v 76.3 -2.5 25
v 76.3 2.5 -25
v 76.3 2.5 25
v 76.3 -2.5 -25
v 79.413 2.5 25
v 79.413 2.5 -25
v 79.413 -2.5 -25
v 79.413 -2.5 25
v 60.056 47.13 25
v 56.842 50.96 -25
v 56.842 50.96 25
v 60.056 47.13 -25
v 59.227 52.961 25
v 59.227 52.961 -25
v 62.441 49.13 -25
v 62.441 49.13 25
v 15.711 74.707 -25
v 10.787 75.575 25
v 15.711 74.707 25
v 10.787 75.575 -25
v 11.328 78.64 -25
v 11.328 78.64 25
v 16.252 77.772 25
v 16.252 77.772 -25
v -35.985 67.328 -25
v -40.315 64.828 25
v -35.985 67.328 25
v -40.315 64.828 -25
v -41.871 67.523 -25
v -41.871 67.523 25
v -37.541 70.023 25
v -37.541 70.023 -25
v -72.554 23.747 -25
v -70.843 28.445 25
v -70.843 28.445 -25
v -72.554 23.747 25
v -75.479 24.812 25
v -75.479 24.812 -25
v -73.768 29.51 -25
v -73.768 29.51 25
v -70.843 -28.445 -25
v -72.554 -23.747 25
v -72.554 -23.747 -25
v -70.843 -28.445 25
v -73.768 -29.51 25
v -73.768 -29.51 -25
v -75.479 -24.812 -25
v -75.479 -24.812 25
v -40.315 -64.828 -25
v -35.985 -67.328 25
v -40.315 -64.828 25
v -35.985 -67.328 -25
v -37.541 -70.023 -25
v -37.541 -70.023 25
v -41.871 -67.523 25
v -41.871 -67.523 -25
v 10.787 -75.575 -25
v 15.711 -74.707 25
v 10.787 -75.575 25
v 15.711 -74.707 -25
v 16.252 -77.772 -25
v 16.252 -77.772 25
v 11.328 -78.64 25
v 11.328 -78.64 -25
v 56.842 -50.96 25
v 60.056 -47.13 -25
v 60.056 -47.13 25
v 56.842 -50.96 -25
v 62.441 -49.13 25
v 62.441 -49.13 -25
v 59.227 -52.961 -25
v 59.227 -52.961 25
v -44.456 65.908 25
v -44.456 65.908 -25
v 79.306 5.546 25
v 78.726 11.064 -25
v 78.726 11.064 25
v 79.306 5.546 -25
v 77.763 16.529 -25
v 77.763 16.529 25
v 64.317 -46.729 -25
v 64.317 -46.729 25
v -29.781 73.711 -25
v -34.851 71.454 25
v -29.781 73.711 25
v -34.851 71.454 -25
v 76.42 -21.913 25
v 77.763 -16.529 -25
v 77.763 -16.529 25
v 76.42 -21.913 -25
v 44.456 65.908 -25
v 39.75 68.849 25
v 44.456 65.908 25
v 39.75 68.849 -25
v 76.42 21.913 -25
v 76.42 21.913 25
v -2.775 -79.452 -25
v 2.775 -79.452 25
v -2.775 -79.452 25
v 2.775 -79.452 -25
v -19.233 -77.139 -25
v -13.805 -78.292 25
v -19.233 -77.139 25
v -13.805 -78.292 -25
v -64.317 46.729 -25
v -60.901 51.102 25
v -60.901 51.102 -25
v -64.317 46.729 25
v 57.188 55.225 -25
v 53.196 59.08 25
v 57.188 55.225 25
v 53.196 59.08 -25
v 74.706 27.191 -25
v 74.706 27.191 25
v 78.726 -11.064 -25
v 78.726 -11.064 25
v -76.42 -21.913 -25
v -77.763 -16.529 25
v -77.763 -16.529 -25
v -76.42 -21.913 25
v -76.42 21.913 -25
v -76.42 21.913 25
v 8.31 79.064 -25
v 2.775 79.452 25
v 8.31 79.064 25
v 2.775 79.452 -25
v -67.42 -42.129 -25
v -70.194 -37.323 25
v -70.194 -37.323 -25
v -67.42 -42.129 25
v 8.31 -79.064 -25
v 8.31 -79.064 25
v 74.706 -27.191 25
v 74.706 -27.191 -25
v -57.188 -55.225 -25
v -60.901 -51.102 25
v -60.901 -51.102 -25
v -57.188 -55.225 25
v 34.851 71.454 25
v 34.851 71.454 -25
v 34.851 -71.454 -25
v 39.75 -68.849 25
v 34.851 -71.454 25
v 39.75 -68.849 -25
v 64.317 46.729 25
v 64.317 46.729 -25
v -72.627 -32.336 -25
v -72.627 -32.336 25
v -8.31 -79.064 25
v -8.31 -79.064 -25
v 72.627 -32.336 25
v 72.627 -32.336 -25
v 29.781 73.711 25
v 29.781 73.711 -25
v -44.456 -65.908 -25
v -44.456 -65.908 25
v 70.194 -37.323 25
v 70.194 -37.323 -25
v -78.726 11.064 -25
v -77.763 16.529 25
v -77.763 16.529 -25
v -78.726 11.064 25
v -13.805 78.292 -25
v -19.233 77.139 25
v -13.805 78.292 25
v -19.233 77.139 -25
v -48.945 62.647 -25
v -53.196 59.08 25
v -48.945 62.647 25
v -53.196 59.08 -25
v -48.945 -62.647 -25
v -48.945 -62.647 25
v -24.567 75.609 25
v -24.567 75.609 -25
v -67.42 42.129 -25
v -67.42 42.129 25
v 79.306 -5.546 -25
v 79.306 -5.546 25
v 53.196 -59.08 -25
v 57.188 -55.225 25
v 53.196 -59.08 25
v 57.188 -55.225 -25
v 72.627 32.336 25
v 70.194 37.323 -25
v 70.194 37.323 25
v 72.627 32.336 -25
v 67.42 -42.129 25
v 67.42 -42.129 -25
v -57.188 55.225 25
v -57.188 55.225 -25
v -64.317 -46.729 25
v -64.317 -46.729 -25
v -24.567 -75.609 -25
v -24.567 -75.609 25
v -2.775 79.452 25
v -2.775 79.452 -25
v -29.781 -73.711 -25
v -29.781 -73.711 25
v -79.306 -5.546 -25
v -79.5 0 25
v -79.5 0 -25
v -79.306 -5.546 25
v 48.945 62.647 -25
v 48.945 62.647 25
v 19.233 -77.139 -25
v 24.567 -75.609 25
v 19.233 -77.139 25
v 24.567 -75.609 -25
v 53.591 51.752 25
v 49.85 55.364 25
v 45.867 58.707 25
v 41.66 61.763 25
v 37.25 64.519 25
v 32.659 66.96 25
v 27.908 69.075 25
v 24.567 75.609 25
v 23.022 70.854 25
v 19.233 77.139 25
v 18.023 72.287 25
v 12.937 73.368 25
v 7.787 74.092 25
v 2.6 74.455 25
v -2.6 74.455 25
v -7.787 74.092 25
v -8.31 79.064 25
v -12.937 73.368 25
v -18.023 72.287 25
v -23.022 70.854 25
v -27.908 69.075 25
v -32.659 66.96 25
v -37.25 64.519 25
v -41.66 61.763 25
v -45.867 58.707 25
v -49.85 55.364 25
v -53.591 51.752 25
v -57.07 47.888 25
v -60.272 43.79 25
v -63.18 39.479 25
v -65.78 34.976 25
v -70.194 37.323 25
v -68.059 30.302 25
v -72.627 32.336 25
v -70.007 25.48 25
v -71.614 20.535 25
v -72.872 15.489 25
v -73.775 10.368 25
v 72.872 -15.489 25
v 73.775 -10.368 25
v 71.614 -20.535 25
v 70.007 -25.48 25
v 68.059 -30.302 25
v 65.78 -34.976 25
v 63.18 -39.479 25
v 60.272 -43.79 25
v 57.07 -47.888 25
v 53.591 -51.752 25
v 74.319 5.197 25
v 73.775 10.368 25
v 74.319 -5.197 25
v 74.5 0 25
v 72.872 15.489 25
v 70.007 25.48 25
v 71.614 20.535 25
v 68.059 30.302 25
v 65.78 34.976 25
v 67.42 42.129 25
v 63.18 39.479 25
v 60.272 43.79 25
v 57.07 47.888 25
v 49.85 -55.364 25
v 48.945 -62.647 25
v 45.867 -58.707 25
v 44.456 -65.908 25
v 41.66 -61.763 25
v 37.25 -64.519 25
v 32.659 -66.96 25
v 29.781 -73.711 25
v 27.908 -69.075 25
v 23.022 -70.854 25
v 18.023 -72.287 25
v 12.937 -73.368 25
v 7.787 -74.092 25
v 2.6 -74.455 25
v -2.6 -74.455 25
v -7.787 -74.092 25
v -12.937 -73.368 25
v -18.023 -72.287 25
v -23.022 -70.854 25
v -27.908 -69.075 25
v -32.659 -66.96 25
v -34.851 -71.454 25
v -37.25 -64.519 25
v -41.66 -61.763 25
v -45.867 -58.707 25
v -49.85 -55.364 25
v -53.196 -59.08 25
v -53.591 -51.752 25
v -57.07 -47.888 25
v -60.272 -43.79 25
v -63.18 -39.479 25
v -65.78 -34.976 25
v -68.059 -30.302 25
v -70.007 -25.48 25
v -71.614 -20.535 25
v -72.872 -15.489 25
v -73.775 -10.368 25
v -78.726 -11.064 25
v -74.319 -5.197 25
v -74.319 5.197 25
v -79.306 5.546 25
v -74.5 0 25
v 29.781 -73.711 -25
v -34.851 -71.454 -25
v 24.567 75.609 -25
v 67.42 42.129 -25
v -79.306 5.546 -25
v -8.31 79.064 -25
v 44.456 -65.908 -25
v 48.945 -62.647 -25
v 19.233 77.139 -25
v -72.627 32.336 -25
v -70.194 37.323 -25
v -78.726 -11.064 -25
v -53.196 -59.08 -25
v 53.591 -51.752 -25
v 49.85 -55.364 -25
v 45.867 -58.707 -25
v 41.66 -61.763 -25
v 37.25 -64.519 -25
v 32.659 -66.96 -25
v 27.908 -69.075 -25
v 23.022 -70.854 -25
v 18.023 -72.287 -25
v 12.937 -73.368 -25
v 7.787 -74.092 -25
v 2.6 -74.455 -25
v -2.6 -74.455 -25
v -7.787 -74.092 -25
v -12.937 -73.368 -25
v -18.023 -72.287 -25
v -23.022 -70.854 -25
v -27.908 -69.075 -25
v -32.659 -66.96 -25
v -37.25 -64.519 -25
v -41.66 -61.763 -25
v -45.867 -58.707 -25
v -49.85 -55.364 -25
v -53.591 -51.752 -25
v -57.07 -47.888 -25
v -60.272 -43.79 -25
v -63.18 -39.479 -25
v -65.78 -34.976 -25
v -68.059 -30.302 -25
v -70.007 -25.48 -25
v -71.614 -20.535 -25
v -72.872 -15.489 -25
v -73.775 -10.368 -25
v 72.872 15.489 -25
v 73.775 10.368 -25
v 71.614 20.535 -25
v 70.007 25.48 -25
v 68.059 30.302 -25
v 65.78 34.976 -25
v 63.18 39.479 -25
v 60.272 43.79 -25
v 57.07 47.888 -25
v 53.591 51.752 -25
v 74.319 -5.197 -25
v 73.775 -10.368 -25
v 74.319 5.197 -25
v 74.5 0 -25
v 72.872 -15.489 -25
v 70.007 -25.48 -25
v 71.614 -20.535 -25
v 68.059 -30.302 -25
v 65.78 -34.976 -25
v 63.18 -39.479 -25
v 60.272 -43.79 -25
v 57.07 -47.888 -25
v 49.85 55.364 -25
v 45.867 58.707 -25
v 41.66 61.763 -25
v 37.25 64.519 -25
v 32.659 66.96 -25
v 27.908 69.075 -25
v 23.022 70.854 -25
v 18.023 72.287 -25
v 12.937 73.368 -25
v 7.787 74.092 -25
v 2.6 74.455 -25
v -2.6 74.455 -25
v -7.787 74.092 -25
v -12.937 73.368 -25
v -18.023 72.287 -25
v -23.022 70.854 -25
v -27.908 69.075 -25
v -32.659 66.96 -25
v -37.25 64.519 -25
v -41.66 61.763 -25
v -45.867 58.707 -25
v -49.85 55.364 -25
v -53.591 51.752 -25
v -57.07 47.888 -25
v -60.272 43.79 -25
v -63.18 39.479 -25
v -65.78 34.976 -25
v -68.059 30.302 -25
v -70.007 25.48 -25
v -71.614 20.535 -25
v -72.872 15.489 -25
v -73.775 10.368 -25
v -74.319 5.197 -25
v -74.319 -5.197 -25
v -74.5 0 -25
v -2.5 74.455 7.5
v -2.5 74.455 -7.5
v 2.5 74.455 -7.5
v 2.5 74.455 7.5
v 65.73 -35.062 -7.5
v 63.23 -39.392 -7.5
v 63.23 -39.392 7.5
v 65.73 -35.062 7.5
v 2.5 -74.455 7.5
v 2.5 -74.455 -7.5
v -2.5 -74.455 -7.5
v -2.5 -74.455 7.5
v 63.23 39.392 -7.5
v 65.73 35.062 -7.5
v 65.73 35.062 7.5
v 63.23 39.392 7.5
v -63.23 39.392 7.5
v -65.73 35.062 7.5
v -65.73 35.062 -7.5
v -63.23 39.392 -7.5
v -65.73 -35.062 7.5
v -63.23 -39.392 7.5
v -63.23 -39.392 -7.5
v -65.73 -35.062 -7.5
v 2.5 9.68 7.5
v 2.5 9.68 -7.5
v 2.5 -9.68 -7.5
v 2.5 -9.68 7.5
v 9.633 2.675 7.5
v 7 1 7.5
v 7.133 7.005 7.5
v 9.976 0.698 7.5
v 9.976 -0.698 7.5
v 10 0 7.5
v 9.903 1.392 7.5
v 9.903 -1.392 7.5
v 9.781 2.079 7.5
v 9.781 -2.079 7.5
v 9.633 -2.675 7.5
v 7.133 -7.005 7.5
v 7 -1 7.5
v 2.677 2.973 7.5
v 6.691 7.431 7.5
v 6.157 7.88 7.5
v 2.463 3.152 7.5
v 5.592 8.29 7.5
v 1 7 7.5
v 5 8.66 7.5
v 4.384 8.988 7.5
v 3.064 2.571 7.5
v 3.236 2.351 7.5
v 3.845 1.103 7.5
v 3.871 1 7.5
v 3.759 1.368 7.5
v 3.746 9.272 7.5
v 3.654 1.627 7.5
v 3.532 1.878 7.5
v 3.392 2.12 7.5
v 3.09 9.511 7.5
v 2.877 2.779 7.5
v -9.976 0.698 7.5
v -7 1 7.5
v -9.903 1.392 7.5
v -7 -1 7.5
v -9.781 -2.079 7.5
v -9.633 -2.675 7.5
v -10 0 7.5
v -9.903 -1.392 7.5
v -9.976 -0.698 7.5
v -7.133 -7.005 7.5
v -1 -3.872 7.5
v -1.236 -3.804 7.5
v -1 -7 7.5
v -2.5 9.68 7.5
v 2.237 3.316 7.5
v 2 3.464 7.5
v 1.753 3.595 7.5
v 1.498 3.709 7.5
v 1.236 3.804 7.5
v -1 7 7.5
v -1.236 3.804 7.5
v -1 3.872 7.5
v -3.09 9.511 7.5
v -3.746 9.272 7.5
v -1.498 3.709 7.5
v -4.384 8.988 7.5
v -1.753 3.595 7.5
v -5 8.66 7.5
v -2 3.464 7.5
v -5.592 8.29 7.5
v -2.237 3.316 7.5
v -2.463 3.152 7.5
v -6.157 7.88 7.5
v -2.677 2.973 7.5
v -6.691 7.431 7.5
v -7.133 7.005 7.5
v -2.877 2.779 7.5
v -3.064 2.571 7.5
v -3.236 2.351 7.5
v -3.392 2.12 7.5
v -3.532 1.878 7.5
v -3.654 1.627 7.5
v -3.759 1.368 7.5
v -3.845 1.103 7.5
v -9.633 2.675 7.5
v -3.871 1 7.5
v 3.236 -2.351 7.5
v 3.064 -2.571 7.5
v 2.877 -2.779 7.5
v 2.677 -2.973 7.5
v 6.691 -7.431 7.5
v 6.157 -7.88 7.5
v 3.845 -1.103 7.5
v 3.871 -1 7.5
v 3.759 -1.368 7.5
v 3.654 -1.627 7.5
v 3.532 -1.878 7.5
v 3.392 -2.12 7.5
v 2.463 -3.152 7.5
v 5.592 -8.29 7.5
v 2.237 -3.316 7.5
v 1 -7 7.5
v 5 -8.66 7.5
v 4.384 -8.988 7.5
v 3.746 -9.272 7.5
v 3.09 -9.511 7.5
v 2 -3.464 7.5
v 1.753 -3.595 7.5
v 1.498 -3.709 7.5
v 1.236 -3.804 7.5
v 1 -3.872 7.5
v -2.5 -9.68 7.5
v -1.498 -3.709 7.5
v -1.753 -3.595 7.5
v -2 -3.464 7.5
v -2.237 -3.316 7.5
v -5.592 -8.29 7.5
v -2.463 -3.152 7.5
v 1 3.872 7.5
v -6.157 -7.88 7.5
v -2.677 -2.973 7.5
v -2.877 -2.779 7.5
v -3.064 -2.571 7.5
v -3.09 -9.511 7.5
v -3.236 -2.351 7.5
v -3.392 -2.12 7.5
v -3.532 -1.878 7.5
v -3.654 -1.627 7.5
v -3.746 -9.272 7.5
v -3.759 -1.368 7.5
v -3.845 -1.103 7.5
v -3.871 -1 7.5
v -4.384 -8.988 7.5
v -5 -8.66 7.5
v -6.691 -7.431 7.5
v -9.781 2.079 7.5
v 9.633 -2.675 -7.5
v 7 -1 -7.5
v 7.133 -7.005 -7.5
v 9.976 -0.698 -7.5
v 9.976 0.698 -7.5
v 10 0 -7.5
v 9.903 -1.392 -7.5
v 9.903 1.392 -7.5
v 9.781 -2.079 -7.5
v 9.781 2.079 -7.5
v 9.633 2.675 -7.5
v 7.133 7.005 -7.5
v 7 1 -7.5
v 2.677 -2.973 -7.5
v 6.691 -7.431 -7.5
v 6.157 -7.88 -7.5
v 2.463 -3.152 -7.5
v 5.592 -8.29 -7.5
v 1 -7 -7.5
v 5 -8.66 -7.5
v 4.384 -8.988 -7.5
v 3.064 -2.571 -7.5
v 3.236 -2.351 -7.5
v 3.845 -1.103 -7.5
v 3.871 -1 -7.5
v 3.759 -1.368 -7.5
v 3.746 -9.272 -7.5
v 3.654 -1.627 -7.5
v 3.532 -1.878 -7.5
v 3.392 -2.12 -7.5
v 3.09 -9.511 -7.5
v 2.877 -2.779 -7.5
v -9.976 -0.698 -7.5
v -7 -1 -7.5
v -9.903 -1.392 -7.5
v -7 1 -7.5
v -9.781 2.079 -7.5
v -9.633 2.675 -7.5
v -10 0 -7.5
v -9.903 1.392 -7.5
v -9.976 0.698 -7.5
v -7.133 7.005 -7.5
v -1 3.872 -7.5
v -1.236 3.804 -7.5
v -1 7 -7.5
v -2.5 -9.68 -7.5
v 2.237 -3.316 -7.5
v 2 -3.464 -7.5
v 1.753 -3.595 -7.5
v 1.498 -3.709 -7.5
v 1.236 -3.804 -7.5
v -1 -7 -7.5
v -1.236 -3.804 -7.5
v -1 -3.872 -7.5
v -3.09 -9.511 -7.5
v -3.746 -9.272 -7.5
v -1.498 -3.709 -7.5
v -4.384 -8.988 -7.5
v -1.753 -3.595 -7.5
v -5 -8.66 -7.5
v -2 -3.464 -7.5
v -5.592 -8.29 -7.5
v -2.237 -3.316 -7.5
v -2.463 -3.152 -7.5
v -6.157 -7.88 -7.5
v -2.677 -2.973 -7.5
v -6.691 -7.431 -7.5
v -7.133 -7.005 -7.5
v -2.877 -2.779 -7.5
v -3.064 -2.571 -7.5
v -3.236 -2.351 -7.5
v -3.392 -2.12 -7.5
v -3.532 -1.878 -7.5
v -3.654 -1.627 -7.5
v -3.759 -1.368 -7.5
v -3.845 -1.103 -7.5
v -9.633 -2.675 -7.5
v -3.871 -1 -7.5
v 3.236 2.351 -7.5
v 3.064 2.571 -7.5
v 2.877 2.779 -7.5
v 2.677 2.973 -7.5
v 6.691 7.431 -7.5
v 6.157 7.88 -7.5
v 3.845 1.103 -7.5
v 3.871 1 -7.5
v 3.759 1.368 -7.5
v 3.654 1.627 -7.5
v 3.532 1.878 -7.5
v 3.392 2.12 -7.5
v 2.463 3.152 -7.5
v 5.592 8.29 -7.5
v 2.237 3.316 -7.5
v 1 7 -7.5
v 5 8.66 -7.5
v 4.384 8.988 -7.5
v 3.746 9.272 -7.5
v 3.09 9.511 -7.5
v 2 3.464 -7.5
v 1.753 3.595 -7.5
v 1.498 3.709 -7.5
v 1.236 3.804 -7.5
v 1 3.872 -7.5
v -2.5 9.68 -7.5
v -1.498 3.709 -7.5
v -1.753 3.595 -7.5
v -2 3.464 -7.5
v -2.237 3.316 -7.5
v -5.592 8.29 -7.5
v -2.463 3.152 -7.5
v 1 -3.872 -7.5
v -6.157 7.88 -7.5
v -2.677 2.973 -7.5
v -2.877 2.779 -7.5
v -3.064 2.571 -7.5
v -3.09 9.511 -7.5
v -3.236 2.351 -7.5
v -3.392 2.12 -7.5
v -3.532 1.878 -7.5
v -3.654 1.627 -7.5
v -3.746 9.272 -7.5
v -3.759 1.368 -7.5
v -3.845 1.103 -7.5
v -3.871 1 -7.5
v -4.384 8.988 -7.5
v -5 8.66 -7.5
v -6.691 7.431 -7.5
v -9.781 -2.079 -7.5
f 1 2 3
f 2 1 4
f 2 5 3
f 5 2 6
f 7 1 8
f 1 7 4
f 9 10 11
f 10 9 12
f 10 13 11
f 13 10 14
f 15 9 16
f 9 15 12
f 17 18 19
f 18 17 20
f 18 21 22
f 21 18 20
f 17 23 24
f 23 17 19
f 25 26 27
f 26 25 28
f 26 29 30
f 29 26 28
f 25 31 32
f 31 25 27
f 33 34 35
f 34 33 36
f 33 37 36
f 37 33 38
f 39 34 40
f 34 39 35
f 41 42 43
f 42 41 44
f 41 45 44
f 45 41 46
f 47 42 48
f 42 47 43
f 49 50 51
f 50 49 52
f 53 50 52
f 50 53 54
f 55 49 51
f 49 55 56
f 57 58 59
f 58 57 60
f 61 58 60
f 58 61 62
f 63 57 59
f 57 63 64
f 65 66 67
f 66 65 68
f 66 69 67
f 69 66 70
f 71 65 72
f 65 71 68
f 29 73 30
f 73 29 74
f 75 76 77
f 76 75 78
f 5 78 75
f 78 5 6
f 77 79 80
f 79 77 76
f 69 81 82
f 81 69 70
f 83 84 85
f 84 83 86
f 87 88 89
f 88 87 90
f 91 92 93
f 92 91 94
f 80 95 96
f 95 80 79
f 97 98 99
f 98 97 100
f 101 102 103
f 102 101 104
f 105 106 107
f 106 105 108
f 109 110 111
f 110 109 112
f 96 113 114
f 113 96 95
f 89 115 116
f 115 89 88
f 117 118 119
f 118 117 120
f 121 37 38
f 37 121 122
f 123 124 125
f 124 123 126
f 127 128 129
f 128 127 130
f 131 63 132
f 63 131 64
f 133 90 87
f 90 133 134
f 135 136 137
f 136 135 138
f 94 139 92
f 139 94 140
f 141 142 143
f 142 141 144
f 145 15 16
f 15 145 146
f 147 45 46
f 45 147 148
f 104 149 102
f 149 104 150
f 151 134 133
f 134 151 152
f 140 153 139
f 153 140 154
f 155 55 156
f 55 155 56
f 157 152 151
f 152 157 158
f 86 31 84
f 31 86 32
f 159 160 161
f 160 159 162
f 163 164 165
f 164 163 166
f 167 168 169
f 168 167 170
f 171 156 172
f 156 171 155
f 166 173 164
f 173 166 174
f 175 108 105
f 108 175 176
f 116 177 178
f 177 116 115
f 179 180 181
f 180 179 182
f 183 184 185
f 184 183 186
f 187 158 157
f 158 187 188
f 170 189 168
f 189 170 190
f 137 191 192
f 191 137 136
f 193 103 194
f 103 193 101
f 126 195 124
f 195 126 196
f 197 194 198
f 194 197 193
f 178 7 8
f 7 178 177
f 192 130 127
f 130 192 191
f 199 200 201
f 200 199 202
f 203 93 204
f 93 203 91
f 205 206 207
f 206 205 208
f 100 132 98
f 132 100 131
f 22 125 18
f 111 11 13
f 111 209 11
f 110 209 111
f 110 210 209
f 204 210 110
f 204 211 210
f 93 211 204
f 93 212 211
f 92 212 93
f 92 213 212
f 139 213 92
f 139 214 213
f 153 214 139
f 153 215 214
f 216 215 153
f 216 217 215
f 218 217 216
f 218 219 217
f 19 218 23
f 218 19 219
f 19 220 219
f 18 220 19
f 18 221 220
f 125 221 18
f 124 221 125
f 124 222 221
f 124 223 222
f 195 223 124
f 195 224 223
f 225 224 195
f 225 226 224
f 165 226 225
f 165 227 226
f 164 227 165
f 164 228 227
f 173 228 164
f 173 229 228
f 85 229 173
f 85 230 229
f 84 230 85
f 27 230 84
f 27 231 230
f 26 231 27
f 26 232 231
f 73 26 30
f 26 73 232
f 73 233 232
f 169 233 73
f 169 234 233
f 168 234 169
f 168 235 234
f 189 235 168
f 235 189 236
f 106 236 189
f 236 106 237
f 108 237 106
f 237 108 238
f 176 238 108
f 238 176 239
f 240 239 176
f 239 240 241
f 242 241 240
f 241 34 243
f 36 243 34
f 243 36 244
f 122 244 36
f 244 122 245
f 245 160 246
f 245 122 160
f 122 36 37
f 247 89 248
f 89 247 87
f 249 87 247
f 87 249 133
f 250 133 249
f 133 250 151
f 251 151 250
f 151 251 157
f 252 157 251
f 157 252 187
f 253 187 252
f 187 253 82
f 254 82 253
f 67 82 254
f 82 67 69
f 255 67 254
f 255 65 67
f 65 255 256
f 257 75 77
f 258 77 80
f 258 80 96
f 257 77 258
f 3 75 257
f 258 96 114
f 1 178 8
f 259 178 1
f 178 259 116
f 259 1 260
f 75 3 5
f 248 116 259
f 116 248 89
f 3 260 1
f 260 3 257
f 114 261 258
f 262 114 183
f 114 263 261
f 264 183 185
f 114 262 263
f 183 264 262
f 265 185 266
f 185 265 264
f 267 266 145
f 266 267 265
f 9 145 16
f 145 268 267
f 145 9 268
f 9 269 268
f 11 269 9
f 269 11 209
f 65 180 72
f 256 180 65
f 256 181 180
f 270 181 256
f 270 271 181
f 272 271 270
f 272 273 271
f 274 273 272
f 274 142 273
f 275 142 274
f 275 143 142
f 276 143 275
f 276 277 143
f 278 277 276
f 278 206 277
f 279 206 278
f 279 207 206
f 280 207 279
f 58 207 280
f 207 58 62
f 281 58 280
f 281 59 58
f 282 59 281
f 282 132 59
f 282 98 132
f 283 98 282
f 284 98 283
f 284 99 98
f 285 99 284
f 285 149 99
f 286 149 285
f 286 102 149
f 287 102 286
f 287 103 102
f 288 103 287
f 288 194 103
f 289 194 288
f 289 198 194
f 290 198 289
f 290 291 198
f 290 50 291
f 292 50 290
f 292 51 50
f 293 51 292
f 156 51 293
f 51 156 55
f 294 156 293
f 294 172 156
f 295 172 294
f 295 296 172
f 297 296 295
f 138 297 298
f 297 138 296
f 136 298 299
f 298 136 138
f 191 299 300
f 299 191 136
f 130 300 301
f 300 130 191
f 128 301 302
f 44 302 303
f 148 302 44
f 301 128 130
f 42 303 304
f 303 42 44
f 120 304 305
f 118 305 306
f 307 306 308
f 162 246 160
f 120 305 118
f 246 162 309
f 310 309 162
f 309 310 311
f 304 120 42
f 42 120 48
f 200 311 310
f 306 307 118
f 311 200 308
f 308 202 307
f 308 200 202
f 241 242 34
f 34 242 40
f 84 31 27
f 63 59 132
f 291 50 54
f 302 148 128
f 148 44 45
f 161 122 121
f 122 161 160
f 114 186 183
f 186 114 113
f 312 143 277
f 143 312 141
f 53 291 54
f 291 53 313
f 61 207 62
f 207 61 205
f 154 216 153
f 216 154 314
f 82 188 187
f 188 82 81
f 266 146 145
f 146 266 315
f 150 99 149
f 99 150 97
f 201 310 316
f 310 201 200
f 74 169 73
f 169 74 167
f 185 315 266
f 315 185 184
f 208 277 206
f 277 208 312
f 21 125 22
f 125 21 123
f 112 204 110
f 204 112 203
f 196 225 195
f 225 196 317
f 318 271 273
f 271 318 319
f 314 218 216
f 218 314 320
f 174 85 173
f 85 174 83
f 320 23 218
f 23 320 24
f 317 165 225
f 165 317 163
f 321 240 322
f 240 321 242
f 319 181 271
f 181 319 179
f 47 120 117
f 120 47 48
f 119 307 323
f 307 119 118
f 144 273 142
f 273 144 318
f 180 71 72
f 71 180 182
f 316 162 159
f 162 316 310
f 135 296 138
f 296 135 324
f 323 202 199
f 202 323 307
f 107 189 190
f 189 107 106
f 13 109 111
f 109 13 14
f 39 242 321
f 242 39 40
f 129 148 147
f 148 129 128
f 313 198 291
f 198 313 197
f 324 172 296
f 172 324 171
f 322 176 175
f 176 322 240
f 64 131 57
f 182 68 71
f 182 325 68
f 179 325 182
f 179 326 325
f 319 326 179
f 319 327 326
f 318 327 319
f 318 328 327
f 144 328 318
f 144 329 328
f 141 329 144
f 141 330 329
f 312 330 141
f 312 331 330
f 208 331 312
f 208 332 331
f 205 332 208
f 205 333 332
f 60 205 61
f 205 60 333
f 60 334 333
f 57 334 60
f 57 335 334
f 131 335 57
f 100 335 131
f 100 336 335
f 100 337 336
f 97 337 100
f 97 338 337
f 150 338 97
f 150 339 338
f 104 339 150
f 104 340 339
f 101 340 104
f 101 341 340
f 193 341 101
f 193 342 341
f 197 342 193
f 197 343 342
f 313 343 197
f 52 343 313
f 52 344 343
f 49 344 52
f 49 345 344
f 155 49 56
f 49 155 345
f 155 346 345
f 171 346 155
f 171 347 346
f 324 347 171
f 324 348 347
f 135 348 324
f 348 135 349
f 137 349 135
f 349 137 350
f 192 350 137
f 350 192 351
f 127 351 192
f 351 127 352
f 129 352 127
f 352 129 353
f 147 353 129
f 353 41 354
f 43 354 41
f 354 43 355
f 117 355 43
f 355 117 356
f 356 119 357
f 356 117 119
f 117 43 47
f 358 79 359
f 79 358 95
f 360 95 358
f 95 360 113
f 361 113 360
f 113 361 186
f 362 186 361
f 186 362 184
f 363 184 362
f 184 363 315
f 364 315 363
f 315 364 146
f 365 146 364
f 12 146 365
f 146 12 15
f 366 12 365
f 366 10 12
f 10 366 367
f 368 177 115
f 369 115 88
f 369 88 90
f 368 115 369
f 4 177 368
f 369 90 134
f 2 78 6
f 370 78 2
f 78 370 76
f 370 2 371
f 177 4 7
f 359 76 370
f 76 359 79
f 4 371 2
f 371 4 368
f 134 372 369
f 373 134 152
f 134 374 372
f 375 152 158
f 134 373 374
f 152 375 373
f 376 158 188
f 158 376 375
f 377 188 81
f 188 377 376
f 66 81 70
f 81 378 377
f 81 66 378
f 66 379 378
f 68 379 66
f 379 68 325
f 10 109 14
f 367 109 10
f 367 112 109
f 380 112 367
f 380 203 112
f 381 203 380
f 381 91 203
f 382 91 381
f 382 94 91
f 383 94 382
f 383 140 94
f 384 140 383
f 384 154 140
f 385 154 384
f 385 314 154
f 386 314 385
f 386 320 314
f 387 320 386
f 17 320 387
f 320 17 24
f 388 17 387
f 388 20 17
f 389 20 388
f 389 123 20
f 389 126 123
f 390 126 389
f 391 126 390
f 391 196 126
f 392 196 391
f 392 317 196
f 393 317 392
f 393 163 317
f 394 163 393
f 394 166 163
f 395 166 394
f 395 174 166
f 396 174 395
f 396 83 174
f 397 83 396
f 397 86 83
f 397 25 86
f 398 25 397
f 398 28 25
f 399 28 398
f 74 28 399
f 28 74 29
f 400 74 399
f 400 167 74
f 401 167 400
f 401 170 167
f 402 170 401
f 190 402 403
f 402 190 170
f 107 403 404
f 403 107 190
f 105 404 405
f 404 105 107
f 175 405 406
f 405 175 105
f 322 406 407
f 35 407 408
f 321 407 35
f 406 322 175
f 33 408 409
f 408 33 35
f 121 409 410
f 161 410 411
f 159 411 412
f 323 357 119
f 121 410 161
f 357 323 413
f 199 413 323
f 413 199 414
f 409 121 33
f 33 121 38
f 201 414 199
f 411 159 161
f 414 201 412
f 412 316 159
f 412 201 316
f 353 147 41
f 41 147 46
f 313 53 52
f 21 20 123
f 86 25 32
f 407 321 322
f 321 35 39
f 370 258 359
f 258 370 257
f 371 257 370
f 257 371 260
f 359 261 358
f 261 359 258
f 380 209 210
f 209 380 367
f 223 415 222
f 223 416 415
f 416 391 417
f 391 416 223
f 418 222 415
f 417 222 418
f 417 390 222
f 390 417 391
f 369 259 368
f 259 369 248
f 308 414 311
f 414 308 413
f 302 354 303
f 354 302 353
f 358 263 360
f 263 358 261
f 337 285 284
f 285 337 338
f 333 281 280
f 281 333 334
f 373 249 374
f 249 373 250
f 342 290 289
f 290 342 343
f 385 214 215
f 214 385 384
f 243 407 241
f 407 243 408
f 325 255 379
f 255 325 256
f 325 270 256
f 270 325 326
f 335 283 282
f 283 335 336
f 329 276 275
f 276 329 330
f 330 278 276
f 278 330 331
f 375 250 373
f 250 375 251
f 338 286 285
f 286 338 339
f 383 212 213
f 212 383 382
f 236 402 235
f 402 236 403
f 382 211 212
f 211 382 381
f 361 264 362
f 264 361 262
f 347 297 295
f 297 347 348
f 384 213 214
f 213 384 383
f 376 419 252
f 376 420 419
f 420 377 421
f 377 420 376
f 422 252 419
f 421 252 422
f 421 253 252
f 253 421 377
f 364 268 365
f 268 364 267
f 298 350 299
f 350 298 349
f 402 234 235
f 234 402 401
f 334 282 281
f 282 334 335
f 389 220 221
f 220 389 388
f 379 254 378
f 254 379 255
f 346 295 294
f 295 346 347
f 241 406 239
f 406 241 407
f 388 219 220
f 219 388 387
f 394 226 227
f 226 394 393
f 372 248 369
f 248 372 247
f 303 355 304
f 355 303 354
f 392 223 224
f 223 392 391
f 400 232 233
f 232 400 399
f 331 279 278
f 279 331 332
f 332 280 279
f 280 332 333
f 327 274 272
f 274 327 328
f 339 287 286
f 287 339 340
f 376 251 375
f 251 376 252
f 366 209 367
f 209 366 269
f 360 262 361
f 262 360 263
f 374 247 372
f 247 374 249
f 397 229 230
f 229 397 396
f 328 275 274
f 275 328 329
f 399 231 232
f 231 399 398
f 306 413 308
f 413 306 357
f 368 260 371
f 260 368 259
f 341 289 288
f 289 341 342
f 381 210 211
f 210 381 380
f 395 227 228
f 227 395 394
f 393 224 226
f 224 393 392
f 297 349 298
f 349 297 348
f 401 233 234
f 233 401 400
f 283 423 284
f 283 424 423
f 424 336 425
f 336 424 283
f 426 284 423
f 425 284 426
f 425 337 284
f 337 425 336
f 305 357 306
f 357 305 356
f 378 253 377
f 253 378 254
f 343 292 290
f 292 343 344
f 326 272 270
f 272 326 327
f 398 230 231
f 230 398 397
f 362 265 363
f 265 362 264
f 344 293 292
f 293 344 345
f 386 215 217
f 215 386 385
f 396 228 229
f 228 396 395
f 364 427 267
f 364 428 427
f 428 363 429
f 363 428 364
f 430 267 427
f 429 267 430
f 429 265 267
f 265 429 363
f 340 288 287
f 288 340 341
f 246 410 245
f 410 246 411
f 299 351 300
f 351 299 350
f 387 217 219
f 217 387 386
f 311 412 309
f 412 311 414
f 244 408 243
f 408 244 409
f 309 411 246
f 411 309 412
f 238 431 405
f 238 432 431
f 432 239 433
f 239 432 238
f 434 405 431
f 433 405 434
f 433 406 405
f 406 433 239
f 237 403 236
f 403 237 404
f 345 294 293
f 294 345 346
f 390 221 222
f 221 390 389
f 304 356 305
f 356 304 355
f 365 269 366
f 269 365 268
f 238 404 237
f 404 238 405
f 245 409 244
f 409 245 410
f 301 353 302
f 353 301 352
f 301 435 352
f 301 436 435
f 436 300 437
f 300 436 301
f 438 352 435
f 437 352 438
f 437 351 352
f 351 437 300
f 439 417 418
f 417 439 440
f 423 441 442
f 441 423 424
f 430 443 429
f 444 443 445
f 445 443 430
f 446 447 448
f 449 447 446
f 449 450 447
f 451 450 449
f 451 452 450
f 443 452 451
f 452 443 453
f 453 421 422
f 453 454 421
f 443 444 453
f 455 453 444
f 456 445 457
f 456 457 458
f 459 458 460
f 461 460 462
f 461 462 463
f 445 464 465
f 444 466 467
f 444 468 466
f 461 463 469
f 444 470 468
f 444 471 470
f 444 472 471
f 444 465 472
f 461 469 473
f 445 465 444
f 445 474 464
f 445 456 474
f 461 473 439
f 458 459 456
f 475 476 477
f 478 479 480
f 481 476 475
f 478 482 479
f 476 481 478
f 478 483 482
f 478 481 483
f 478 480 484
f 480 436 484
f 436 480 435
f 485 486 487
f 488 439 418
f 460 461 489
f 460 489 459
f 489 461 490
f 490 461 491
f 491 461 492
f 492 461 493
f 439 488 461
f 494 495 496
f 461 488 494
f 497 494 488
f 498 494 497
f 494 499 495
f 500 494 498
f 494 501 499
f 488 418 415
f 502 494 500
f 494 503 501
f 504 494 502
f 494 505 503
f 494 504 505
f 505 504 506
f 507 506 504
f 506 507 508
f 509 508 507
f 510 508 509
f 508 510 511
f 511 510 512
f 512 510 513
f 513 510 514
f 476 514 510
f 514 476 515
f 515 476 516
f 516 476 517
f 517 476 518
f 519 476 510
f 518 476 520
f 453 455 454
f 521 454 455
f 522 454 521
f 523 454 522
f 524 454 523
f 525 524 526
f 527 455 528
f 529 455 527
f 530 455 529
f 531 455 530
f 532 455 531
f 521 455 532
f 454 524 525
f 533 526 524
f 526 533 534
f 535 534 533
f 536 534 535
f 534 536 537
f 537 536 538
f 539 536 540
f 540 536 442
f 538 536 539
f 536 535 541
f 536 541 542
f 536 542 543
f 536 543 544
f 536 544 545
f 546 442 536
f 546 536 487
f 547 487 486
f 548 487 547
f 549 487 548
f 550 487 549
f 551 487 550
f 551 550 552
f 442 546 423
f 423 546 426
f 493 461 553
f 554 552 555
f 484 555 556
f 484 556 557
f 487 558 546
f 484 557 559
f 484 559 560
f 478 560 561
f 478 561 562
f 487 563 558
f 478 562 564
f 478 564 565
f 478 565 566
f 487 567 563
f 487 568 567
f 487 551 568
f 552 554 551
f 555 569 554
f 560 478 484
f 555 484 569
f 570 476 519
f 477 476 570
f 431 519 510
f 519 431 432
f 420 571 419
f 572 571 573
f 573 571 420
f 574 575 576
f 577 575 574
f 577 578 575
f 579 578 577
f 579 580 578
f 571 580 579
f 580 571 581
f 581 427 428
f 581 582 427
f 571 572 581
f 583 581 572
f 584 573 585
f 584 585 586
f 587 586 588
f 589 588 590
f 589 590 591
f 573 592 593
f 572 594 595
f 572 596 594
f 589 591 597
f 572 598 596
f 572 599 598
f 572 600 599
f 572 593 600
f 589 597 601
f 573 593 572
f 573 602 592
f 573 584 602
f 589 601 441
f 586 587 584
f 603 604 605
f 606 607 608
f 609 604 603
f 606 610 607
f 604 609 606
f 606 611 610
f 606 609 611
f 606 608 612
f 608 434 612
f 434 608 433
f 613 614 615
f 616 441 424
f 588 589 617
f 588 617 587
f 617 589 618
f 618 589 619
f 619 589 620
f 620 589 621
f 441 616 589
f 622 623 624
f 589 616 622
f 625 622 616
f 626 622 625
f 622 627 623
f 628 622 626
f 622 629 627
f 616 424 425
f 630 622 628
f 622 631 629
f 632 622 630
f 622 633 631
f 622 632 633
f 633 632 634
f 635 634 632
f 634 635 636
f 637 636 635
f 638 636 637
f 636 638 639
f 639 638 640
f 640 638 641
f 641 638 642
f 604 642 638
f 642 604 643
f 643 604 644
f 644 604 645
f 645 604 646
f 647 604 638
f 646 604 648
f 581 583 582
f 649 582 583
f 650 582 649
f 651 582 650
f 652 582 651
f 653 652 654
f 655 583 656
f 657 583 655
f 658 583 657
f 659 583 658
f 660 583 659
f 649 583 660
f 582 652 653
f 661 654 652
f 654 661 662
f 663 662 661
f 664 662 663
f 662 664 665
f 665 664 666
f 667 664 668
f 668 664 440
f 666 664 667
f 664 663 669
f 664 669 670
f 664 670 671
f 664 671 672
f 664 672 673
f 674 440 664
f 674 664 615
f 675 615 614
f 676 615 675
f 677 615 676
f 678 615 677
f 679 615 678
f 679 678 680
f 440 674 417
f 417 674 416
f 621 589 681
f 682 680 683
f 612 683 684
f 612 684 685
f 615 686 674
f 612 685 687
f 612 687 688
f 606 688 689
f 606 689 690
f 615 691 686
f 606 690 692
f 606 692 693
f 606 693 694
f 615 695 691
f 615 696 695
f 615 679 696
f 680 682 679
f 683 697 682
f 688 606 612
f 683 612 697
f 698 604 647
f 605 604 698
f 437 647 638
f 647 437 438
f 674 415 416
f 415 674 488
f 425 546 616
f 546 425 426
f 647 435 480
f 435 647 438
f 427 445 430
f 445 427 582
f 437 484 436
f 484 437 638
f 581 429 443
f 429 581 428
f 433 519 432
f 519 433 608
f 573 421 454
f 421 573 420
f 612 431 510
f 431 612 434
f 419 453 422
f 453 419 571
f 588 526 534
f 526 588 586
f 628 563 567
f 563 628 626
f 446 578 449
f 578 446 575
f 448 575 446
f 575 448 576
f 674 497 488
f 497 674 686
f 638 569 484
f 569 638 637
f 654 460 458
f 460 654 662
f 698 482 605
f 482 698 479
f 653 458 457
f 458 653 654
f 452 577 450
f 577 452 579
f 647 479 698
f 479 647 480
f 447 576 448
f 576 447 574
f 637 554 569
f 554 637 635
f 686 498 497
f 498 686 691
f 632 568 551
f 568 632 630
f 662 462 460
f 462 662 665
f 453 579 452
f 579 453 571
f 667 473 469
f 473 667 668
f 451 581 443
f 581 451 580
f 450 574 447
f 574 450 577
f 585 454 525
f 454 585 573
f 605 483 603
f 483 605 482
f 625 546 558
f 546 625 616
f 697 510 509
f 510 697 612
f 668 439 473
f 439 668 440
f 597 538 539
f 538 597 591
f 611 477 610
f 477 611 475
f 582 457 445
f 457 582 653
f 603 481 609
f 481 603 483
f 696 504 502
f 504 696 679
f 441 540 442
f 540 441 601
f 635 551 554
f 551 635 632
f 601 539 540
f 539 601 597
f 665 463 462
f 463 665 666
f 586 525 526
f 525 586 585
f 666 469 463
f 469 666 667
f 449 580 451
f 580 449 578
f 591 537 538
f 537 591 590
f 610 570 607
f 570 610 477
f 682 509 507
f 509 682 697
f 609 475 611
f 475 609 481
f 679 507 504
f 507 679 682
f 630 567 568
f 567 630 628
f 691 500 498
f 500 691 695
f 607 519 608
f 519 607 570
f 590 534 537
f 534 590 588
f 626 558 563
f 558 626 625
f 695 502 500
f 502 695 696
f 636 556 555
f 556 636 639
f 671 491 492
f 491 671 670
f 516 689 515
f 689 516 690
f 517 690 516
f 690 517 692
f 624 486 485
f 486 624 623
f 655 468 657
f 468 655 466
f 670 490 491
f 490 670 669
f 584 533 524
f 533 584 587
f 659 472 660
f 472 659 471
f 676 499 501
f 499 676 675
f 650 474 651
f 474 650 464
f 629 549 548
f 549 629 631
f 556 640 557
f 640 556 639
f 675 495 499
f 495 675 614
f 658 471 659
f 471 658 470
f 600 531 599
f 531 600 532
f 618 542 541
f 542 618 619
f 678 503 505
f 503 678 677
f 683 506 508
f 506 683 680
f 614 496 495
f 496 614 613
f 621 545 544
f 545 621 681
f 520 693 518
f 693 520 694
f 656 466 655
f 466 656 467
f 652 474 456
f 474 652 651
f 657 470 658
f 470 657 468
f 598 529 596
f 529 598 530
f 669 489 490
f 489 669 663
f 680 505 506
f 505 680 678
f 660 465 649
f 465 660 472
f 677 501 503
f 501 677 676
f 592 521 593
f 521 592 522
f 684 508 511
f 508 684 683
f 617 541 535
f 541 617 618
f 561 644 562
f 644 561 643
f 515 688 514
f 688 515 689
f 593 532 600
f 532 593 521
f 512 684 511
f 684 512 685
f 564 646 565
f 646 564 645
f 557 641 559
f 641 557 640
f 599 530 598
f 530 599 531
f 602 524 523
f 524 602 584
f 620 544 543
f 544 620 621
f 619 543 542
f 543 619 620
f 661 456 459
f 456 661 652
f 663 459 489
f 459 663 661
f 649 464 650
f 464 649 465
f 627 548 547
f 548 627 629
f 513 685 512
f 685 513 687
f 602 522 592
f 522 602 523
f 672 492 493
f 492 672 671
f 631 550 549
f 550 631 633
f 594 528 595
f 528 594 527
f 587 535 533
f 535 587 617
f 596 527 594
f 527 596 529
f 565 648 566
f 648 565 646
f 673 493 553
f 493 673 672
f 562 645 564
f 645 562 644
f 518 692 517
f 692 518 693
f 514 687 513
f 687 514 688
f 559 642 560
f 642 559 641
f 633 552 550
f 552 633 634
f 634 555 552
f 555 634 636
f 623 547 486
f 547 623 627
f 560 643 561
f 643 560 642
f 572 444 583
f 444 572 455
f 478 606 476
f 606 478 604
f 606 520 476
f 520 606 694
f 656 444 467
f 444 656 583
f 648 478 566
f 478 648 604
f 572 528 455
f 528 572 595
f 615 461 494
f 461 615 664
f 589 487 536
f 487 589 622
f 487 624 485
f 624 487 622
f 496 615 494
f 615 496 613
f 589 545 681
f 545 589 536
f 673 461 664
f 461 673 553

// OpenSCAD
// Global
$fn=90;

// x size must be double since it is being centered
magnet_size = [6.4, 5, 60];
// This version has 9 magnets on the rotor
magnet_step = [0: 40: 360];

// Rotor (all in millimetres)
r_out_diameter = 159;
r_in_diameter = 149;

module grooves( diameter=1, step=[0: 30: 360], g_size=[1, 1, 1] ) {
    radius = diameter / 2;

    for ( angle = step ) {
        x = radius * cos( angle );
        y = radius * sin( angle );
        translate( [x, y , 0] )
            rotate( a = angle )
                cube( size = g_size, center=true );
    }
}

// Rotor Definition
union() {
 difference() {
    cylinder( h=50, d=r_out_diameter, center=true );
    grooves( r_out_diameter, magnet_step, magnet_size );
    cylinder( h=50, d=r_in_diameter, center=true );
 }

 // Rotor's spokes
 difference() {
    union() {
        cube( size=[5,158,15], center=true );
        rotate( 120 ) cube( size=[5,158,15], center=true );
        rotate( 240 ) cube( size=[5,158,15], center=true );
        cylinder( h=15, d=20, center=true );
    }
    // shaft opening
    cylinder( h=50, d=8, center=true );
    cube( size=[14,2,50], center=true );
    rotate(90) cube( size=[14,2,50], center=true );
 }
}
